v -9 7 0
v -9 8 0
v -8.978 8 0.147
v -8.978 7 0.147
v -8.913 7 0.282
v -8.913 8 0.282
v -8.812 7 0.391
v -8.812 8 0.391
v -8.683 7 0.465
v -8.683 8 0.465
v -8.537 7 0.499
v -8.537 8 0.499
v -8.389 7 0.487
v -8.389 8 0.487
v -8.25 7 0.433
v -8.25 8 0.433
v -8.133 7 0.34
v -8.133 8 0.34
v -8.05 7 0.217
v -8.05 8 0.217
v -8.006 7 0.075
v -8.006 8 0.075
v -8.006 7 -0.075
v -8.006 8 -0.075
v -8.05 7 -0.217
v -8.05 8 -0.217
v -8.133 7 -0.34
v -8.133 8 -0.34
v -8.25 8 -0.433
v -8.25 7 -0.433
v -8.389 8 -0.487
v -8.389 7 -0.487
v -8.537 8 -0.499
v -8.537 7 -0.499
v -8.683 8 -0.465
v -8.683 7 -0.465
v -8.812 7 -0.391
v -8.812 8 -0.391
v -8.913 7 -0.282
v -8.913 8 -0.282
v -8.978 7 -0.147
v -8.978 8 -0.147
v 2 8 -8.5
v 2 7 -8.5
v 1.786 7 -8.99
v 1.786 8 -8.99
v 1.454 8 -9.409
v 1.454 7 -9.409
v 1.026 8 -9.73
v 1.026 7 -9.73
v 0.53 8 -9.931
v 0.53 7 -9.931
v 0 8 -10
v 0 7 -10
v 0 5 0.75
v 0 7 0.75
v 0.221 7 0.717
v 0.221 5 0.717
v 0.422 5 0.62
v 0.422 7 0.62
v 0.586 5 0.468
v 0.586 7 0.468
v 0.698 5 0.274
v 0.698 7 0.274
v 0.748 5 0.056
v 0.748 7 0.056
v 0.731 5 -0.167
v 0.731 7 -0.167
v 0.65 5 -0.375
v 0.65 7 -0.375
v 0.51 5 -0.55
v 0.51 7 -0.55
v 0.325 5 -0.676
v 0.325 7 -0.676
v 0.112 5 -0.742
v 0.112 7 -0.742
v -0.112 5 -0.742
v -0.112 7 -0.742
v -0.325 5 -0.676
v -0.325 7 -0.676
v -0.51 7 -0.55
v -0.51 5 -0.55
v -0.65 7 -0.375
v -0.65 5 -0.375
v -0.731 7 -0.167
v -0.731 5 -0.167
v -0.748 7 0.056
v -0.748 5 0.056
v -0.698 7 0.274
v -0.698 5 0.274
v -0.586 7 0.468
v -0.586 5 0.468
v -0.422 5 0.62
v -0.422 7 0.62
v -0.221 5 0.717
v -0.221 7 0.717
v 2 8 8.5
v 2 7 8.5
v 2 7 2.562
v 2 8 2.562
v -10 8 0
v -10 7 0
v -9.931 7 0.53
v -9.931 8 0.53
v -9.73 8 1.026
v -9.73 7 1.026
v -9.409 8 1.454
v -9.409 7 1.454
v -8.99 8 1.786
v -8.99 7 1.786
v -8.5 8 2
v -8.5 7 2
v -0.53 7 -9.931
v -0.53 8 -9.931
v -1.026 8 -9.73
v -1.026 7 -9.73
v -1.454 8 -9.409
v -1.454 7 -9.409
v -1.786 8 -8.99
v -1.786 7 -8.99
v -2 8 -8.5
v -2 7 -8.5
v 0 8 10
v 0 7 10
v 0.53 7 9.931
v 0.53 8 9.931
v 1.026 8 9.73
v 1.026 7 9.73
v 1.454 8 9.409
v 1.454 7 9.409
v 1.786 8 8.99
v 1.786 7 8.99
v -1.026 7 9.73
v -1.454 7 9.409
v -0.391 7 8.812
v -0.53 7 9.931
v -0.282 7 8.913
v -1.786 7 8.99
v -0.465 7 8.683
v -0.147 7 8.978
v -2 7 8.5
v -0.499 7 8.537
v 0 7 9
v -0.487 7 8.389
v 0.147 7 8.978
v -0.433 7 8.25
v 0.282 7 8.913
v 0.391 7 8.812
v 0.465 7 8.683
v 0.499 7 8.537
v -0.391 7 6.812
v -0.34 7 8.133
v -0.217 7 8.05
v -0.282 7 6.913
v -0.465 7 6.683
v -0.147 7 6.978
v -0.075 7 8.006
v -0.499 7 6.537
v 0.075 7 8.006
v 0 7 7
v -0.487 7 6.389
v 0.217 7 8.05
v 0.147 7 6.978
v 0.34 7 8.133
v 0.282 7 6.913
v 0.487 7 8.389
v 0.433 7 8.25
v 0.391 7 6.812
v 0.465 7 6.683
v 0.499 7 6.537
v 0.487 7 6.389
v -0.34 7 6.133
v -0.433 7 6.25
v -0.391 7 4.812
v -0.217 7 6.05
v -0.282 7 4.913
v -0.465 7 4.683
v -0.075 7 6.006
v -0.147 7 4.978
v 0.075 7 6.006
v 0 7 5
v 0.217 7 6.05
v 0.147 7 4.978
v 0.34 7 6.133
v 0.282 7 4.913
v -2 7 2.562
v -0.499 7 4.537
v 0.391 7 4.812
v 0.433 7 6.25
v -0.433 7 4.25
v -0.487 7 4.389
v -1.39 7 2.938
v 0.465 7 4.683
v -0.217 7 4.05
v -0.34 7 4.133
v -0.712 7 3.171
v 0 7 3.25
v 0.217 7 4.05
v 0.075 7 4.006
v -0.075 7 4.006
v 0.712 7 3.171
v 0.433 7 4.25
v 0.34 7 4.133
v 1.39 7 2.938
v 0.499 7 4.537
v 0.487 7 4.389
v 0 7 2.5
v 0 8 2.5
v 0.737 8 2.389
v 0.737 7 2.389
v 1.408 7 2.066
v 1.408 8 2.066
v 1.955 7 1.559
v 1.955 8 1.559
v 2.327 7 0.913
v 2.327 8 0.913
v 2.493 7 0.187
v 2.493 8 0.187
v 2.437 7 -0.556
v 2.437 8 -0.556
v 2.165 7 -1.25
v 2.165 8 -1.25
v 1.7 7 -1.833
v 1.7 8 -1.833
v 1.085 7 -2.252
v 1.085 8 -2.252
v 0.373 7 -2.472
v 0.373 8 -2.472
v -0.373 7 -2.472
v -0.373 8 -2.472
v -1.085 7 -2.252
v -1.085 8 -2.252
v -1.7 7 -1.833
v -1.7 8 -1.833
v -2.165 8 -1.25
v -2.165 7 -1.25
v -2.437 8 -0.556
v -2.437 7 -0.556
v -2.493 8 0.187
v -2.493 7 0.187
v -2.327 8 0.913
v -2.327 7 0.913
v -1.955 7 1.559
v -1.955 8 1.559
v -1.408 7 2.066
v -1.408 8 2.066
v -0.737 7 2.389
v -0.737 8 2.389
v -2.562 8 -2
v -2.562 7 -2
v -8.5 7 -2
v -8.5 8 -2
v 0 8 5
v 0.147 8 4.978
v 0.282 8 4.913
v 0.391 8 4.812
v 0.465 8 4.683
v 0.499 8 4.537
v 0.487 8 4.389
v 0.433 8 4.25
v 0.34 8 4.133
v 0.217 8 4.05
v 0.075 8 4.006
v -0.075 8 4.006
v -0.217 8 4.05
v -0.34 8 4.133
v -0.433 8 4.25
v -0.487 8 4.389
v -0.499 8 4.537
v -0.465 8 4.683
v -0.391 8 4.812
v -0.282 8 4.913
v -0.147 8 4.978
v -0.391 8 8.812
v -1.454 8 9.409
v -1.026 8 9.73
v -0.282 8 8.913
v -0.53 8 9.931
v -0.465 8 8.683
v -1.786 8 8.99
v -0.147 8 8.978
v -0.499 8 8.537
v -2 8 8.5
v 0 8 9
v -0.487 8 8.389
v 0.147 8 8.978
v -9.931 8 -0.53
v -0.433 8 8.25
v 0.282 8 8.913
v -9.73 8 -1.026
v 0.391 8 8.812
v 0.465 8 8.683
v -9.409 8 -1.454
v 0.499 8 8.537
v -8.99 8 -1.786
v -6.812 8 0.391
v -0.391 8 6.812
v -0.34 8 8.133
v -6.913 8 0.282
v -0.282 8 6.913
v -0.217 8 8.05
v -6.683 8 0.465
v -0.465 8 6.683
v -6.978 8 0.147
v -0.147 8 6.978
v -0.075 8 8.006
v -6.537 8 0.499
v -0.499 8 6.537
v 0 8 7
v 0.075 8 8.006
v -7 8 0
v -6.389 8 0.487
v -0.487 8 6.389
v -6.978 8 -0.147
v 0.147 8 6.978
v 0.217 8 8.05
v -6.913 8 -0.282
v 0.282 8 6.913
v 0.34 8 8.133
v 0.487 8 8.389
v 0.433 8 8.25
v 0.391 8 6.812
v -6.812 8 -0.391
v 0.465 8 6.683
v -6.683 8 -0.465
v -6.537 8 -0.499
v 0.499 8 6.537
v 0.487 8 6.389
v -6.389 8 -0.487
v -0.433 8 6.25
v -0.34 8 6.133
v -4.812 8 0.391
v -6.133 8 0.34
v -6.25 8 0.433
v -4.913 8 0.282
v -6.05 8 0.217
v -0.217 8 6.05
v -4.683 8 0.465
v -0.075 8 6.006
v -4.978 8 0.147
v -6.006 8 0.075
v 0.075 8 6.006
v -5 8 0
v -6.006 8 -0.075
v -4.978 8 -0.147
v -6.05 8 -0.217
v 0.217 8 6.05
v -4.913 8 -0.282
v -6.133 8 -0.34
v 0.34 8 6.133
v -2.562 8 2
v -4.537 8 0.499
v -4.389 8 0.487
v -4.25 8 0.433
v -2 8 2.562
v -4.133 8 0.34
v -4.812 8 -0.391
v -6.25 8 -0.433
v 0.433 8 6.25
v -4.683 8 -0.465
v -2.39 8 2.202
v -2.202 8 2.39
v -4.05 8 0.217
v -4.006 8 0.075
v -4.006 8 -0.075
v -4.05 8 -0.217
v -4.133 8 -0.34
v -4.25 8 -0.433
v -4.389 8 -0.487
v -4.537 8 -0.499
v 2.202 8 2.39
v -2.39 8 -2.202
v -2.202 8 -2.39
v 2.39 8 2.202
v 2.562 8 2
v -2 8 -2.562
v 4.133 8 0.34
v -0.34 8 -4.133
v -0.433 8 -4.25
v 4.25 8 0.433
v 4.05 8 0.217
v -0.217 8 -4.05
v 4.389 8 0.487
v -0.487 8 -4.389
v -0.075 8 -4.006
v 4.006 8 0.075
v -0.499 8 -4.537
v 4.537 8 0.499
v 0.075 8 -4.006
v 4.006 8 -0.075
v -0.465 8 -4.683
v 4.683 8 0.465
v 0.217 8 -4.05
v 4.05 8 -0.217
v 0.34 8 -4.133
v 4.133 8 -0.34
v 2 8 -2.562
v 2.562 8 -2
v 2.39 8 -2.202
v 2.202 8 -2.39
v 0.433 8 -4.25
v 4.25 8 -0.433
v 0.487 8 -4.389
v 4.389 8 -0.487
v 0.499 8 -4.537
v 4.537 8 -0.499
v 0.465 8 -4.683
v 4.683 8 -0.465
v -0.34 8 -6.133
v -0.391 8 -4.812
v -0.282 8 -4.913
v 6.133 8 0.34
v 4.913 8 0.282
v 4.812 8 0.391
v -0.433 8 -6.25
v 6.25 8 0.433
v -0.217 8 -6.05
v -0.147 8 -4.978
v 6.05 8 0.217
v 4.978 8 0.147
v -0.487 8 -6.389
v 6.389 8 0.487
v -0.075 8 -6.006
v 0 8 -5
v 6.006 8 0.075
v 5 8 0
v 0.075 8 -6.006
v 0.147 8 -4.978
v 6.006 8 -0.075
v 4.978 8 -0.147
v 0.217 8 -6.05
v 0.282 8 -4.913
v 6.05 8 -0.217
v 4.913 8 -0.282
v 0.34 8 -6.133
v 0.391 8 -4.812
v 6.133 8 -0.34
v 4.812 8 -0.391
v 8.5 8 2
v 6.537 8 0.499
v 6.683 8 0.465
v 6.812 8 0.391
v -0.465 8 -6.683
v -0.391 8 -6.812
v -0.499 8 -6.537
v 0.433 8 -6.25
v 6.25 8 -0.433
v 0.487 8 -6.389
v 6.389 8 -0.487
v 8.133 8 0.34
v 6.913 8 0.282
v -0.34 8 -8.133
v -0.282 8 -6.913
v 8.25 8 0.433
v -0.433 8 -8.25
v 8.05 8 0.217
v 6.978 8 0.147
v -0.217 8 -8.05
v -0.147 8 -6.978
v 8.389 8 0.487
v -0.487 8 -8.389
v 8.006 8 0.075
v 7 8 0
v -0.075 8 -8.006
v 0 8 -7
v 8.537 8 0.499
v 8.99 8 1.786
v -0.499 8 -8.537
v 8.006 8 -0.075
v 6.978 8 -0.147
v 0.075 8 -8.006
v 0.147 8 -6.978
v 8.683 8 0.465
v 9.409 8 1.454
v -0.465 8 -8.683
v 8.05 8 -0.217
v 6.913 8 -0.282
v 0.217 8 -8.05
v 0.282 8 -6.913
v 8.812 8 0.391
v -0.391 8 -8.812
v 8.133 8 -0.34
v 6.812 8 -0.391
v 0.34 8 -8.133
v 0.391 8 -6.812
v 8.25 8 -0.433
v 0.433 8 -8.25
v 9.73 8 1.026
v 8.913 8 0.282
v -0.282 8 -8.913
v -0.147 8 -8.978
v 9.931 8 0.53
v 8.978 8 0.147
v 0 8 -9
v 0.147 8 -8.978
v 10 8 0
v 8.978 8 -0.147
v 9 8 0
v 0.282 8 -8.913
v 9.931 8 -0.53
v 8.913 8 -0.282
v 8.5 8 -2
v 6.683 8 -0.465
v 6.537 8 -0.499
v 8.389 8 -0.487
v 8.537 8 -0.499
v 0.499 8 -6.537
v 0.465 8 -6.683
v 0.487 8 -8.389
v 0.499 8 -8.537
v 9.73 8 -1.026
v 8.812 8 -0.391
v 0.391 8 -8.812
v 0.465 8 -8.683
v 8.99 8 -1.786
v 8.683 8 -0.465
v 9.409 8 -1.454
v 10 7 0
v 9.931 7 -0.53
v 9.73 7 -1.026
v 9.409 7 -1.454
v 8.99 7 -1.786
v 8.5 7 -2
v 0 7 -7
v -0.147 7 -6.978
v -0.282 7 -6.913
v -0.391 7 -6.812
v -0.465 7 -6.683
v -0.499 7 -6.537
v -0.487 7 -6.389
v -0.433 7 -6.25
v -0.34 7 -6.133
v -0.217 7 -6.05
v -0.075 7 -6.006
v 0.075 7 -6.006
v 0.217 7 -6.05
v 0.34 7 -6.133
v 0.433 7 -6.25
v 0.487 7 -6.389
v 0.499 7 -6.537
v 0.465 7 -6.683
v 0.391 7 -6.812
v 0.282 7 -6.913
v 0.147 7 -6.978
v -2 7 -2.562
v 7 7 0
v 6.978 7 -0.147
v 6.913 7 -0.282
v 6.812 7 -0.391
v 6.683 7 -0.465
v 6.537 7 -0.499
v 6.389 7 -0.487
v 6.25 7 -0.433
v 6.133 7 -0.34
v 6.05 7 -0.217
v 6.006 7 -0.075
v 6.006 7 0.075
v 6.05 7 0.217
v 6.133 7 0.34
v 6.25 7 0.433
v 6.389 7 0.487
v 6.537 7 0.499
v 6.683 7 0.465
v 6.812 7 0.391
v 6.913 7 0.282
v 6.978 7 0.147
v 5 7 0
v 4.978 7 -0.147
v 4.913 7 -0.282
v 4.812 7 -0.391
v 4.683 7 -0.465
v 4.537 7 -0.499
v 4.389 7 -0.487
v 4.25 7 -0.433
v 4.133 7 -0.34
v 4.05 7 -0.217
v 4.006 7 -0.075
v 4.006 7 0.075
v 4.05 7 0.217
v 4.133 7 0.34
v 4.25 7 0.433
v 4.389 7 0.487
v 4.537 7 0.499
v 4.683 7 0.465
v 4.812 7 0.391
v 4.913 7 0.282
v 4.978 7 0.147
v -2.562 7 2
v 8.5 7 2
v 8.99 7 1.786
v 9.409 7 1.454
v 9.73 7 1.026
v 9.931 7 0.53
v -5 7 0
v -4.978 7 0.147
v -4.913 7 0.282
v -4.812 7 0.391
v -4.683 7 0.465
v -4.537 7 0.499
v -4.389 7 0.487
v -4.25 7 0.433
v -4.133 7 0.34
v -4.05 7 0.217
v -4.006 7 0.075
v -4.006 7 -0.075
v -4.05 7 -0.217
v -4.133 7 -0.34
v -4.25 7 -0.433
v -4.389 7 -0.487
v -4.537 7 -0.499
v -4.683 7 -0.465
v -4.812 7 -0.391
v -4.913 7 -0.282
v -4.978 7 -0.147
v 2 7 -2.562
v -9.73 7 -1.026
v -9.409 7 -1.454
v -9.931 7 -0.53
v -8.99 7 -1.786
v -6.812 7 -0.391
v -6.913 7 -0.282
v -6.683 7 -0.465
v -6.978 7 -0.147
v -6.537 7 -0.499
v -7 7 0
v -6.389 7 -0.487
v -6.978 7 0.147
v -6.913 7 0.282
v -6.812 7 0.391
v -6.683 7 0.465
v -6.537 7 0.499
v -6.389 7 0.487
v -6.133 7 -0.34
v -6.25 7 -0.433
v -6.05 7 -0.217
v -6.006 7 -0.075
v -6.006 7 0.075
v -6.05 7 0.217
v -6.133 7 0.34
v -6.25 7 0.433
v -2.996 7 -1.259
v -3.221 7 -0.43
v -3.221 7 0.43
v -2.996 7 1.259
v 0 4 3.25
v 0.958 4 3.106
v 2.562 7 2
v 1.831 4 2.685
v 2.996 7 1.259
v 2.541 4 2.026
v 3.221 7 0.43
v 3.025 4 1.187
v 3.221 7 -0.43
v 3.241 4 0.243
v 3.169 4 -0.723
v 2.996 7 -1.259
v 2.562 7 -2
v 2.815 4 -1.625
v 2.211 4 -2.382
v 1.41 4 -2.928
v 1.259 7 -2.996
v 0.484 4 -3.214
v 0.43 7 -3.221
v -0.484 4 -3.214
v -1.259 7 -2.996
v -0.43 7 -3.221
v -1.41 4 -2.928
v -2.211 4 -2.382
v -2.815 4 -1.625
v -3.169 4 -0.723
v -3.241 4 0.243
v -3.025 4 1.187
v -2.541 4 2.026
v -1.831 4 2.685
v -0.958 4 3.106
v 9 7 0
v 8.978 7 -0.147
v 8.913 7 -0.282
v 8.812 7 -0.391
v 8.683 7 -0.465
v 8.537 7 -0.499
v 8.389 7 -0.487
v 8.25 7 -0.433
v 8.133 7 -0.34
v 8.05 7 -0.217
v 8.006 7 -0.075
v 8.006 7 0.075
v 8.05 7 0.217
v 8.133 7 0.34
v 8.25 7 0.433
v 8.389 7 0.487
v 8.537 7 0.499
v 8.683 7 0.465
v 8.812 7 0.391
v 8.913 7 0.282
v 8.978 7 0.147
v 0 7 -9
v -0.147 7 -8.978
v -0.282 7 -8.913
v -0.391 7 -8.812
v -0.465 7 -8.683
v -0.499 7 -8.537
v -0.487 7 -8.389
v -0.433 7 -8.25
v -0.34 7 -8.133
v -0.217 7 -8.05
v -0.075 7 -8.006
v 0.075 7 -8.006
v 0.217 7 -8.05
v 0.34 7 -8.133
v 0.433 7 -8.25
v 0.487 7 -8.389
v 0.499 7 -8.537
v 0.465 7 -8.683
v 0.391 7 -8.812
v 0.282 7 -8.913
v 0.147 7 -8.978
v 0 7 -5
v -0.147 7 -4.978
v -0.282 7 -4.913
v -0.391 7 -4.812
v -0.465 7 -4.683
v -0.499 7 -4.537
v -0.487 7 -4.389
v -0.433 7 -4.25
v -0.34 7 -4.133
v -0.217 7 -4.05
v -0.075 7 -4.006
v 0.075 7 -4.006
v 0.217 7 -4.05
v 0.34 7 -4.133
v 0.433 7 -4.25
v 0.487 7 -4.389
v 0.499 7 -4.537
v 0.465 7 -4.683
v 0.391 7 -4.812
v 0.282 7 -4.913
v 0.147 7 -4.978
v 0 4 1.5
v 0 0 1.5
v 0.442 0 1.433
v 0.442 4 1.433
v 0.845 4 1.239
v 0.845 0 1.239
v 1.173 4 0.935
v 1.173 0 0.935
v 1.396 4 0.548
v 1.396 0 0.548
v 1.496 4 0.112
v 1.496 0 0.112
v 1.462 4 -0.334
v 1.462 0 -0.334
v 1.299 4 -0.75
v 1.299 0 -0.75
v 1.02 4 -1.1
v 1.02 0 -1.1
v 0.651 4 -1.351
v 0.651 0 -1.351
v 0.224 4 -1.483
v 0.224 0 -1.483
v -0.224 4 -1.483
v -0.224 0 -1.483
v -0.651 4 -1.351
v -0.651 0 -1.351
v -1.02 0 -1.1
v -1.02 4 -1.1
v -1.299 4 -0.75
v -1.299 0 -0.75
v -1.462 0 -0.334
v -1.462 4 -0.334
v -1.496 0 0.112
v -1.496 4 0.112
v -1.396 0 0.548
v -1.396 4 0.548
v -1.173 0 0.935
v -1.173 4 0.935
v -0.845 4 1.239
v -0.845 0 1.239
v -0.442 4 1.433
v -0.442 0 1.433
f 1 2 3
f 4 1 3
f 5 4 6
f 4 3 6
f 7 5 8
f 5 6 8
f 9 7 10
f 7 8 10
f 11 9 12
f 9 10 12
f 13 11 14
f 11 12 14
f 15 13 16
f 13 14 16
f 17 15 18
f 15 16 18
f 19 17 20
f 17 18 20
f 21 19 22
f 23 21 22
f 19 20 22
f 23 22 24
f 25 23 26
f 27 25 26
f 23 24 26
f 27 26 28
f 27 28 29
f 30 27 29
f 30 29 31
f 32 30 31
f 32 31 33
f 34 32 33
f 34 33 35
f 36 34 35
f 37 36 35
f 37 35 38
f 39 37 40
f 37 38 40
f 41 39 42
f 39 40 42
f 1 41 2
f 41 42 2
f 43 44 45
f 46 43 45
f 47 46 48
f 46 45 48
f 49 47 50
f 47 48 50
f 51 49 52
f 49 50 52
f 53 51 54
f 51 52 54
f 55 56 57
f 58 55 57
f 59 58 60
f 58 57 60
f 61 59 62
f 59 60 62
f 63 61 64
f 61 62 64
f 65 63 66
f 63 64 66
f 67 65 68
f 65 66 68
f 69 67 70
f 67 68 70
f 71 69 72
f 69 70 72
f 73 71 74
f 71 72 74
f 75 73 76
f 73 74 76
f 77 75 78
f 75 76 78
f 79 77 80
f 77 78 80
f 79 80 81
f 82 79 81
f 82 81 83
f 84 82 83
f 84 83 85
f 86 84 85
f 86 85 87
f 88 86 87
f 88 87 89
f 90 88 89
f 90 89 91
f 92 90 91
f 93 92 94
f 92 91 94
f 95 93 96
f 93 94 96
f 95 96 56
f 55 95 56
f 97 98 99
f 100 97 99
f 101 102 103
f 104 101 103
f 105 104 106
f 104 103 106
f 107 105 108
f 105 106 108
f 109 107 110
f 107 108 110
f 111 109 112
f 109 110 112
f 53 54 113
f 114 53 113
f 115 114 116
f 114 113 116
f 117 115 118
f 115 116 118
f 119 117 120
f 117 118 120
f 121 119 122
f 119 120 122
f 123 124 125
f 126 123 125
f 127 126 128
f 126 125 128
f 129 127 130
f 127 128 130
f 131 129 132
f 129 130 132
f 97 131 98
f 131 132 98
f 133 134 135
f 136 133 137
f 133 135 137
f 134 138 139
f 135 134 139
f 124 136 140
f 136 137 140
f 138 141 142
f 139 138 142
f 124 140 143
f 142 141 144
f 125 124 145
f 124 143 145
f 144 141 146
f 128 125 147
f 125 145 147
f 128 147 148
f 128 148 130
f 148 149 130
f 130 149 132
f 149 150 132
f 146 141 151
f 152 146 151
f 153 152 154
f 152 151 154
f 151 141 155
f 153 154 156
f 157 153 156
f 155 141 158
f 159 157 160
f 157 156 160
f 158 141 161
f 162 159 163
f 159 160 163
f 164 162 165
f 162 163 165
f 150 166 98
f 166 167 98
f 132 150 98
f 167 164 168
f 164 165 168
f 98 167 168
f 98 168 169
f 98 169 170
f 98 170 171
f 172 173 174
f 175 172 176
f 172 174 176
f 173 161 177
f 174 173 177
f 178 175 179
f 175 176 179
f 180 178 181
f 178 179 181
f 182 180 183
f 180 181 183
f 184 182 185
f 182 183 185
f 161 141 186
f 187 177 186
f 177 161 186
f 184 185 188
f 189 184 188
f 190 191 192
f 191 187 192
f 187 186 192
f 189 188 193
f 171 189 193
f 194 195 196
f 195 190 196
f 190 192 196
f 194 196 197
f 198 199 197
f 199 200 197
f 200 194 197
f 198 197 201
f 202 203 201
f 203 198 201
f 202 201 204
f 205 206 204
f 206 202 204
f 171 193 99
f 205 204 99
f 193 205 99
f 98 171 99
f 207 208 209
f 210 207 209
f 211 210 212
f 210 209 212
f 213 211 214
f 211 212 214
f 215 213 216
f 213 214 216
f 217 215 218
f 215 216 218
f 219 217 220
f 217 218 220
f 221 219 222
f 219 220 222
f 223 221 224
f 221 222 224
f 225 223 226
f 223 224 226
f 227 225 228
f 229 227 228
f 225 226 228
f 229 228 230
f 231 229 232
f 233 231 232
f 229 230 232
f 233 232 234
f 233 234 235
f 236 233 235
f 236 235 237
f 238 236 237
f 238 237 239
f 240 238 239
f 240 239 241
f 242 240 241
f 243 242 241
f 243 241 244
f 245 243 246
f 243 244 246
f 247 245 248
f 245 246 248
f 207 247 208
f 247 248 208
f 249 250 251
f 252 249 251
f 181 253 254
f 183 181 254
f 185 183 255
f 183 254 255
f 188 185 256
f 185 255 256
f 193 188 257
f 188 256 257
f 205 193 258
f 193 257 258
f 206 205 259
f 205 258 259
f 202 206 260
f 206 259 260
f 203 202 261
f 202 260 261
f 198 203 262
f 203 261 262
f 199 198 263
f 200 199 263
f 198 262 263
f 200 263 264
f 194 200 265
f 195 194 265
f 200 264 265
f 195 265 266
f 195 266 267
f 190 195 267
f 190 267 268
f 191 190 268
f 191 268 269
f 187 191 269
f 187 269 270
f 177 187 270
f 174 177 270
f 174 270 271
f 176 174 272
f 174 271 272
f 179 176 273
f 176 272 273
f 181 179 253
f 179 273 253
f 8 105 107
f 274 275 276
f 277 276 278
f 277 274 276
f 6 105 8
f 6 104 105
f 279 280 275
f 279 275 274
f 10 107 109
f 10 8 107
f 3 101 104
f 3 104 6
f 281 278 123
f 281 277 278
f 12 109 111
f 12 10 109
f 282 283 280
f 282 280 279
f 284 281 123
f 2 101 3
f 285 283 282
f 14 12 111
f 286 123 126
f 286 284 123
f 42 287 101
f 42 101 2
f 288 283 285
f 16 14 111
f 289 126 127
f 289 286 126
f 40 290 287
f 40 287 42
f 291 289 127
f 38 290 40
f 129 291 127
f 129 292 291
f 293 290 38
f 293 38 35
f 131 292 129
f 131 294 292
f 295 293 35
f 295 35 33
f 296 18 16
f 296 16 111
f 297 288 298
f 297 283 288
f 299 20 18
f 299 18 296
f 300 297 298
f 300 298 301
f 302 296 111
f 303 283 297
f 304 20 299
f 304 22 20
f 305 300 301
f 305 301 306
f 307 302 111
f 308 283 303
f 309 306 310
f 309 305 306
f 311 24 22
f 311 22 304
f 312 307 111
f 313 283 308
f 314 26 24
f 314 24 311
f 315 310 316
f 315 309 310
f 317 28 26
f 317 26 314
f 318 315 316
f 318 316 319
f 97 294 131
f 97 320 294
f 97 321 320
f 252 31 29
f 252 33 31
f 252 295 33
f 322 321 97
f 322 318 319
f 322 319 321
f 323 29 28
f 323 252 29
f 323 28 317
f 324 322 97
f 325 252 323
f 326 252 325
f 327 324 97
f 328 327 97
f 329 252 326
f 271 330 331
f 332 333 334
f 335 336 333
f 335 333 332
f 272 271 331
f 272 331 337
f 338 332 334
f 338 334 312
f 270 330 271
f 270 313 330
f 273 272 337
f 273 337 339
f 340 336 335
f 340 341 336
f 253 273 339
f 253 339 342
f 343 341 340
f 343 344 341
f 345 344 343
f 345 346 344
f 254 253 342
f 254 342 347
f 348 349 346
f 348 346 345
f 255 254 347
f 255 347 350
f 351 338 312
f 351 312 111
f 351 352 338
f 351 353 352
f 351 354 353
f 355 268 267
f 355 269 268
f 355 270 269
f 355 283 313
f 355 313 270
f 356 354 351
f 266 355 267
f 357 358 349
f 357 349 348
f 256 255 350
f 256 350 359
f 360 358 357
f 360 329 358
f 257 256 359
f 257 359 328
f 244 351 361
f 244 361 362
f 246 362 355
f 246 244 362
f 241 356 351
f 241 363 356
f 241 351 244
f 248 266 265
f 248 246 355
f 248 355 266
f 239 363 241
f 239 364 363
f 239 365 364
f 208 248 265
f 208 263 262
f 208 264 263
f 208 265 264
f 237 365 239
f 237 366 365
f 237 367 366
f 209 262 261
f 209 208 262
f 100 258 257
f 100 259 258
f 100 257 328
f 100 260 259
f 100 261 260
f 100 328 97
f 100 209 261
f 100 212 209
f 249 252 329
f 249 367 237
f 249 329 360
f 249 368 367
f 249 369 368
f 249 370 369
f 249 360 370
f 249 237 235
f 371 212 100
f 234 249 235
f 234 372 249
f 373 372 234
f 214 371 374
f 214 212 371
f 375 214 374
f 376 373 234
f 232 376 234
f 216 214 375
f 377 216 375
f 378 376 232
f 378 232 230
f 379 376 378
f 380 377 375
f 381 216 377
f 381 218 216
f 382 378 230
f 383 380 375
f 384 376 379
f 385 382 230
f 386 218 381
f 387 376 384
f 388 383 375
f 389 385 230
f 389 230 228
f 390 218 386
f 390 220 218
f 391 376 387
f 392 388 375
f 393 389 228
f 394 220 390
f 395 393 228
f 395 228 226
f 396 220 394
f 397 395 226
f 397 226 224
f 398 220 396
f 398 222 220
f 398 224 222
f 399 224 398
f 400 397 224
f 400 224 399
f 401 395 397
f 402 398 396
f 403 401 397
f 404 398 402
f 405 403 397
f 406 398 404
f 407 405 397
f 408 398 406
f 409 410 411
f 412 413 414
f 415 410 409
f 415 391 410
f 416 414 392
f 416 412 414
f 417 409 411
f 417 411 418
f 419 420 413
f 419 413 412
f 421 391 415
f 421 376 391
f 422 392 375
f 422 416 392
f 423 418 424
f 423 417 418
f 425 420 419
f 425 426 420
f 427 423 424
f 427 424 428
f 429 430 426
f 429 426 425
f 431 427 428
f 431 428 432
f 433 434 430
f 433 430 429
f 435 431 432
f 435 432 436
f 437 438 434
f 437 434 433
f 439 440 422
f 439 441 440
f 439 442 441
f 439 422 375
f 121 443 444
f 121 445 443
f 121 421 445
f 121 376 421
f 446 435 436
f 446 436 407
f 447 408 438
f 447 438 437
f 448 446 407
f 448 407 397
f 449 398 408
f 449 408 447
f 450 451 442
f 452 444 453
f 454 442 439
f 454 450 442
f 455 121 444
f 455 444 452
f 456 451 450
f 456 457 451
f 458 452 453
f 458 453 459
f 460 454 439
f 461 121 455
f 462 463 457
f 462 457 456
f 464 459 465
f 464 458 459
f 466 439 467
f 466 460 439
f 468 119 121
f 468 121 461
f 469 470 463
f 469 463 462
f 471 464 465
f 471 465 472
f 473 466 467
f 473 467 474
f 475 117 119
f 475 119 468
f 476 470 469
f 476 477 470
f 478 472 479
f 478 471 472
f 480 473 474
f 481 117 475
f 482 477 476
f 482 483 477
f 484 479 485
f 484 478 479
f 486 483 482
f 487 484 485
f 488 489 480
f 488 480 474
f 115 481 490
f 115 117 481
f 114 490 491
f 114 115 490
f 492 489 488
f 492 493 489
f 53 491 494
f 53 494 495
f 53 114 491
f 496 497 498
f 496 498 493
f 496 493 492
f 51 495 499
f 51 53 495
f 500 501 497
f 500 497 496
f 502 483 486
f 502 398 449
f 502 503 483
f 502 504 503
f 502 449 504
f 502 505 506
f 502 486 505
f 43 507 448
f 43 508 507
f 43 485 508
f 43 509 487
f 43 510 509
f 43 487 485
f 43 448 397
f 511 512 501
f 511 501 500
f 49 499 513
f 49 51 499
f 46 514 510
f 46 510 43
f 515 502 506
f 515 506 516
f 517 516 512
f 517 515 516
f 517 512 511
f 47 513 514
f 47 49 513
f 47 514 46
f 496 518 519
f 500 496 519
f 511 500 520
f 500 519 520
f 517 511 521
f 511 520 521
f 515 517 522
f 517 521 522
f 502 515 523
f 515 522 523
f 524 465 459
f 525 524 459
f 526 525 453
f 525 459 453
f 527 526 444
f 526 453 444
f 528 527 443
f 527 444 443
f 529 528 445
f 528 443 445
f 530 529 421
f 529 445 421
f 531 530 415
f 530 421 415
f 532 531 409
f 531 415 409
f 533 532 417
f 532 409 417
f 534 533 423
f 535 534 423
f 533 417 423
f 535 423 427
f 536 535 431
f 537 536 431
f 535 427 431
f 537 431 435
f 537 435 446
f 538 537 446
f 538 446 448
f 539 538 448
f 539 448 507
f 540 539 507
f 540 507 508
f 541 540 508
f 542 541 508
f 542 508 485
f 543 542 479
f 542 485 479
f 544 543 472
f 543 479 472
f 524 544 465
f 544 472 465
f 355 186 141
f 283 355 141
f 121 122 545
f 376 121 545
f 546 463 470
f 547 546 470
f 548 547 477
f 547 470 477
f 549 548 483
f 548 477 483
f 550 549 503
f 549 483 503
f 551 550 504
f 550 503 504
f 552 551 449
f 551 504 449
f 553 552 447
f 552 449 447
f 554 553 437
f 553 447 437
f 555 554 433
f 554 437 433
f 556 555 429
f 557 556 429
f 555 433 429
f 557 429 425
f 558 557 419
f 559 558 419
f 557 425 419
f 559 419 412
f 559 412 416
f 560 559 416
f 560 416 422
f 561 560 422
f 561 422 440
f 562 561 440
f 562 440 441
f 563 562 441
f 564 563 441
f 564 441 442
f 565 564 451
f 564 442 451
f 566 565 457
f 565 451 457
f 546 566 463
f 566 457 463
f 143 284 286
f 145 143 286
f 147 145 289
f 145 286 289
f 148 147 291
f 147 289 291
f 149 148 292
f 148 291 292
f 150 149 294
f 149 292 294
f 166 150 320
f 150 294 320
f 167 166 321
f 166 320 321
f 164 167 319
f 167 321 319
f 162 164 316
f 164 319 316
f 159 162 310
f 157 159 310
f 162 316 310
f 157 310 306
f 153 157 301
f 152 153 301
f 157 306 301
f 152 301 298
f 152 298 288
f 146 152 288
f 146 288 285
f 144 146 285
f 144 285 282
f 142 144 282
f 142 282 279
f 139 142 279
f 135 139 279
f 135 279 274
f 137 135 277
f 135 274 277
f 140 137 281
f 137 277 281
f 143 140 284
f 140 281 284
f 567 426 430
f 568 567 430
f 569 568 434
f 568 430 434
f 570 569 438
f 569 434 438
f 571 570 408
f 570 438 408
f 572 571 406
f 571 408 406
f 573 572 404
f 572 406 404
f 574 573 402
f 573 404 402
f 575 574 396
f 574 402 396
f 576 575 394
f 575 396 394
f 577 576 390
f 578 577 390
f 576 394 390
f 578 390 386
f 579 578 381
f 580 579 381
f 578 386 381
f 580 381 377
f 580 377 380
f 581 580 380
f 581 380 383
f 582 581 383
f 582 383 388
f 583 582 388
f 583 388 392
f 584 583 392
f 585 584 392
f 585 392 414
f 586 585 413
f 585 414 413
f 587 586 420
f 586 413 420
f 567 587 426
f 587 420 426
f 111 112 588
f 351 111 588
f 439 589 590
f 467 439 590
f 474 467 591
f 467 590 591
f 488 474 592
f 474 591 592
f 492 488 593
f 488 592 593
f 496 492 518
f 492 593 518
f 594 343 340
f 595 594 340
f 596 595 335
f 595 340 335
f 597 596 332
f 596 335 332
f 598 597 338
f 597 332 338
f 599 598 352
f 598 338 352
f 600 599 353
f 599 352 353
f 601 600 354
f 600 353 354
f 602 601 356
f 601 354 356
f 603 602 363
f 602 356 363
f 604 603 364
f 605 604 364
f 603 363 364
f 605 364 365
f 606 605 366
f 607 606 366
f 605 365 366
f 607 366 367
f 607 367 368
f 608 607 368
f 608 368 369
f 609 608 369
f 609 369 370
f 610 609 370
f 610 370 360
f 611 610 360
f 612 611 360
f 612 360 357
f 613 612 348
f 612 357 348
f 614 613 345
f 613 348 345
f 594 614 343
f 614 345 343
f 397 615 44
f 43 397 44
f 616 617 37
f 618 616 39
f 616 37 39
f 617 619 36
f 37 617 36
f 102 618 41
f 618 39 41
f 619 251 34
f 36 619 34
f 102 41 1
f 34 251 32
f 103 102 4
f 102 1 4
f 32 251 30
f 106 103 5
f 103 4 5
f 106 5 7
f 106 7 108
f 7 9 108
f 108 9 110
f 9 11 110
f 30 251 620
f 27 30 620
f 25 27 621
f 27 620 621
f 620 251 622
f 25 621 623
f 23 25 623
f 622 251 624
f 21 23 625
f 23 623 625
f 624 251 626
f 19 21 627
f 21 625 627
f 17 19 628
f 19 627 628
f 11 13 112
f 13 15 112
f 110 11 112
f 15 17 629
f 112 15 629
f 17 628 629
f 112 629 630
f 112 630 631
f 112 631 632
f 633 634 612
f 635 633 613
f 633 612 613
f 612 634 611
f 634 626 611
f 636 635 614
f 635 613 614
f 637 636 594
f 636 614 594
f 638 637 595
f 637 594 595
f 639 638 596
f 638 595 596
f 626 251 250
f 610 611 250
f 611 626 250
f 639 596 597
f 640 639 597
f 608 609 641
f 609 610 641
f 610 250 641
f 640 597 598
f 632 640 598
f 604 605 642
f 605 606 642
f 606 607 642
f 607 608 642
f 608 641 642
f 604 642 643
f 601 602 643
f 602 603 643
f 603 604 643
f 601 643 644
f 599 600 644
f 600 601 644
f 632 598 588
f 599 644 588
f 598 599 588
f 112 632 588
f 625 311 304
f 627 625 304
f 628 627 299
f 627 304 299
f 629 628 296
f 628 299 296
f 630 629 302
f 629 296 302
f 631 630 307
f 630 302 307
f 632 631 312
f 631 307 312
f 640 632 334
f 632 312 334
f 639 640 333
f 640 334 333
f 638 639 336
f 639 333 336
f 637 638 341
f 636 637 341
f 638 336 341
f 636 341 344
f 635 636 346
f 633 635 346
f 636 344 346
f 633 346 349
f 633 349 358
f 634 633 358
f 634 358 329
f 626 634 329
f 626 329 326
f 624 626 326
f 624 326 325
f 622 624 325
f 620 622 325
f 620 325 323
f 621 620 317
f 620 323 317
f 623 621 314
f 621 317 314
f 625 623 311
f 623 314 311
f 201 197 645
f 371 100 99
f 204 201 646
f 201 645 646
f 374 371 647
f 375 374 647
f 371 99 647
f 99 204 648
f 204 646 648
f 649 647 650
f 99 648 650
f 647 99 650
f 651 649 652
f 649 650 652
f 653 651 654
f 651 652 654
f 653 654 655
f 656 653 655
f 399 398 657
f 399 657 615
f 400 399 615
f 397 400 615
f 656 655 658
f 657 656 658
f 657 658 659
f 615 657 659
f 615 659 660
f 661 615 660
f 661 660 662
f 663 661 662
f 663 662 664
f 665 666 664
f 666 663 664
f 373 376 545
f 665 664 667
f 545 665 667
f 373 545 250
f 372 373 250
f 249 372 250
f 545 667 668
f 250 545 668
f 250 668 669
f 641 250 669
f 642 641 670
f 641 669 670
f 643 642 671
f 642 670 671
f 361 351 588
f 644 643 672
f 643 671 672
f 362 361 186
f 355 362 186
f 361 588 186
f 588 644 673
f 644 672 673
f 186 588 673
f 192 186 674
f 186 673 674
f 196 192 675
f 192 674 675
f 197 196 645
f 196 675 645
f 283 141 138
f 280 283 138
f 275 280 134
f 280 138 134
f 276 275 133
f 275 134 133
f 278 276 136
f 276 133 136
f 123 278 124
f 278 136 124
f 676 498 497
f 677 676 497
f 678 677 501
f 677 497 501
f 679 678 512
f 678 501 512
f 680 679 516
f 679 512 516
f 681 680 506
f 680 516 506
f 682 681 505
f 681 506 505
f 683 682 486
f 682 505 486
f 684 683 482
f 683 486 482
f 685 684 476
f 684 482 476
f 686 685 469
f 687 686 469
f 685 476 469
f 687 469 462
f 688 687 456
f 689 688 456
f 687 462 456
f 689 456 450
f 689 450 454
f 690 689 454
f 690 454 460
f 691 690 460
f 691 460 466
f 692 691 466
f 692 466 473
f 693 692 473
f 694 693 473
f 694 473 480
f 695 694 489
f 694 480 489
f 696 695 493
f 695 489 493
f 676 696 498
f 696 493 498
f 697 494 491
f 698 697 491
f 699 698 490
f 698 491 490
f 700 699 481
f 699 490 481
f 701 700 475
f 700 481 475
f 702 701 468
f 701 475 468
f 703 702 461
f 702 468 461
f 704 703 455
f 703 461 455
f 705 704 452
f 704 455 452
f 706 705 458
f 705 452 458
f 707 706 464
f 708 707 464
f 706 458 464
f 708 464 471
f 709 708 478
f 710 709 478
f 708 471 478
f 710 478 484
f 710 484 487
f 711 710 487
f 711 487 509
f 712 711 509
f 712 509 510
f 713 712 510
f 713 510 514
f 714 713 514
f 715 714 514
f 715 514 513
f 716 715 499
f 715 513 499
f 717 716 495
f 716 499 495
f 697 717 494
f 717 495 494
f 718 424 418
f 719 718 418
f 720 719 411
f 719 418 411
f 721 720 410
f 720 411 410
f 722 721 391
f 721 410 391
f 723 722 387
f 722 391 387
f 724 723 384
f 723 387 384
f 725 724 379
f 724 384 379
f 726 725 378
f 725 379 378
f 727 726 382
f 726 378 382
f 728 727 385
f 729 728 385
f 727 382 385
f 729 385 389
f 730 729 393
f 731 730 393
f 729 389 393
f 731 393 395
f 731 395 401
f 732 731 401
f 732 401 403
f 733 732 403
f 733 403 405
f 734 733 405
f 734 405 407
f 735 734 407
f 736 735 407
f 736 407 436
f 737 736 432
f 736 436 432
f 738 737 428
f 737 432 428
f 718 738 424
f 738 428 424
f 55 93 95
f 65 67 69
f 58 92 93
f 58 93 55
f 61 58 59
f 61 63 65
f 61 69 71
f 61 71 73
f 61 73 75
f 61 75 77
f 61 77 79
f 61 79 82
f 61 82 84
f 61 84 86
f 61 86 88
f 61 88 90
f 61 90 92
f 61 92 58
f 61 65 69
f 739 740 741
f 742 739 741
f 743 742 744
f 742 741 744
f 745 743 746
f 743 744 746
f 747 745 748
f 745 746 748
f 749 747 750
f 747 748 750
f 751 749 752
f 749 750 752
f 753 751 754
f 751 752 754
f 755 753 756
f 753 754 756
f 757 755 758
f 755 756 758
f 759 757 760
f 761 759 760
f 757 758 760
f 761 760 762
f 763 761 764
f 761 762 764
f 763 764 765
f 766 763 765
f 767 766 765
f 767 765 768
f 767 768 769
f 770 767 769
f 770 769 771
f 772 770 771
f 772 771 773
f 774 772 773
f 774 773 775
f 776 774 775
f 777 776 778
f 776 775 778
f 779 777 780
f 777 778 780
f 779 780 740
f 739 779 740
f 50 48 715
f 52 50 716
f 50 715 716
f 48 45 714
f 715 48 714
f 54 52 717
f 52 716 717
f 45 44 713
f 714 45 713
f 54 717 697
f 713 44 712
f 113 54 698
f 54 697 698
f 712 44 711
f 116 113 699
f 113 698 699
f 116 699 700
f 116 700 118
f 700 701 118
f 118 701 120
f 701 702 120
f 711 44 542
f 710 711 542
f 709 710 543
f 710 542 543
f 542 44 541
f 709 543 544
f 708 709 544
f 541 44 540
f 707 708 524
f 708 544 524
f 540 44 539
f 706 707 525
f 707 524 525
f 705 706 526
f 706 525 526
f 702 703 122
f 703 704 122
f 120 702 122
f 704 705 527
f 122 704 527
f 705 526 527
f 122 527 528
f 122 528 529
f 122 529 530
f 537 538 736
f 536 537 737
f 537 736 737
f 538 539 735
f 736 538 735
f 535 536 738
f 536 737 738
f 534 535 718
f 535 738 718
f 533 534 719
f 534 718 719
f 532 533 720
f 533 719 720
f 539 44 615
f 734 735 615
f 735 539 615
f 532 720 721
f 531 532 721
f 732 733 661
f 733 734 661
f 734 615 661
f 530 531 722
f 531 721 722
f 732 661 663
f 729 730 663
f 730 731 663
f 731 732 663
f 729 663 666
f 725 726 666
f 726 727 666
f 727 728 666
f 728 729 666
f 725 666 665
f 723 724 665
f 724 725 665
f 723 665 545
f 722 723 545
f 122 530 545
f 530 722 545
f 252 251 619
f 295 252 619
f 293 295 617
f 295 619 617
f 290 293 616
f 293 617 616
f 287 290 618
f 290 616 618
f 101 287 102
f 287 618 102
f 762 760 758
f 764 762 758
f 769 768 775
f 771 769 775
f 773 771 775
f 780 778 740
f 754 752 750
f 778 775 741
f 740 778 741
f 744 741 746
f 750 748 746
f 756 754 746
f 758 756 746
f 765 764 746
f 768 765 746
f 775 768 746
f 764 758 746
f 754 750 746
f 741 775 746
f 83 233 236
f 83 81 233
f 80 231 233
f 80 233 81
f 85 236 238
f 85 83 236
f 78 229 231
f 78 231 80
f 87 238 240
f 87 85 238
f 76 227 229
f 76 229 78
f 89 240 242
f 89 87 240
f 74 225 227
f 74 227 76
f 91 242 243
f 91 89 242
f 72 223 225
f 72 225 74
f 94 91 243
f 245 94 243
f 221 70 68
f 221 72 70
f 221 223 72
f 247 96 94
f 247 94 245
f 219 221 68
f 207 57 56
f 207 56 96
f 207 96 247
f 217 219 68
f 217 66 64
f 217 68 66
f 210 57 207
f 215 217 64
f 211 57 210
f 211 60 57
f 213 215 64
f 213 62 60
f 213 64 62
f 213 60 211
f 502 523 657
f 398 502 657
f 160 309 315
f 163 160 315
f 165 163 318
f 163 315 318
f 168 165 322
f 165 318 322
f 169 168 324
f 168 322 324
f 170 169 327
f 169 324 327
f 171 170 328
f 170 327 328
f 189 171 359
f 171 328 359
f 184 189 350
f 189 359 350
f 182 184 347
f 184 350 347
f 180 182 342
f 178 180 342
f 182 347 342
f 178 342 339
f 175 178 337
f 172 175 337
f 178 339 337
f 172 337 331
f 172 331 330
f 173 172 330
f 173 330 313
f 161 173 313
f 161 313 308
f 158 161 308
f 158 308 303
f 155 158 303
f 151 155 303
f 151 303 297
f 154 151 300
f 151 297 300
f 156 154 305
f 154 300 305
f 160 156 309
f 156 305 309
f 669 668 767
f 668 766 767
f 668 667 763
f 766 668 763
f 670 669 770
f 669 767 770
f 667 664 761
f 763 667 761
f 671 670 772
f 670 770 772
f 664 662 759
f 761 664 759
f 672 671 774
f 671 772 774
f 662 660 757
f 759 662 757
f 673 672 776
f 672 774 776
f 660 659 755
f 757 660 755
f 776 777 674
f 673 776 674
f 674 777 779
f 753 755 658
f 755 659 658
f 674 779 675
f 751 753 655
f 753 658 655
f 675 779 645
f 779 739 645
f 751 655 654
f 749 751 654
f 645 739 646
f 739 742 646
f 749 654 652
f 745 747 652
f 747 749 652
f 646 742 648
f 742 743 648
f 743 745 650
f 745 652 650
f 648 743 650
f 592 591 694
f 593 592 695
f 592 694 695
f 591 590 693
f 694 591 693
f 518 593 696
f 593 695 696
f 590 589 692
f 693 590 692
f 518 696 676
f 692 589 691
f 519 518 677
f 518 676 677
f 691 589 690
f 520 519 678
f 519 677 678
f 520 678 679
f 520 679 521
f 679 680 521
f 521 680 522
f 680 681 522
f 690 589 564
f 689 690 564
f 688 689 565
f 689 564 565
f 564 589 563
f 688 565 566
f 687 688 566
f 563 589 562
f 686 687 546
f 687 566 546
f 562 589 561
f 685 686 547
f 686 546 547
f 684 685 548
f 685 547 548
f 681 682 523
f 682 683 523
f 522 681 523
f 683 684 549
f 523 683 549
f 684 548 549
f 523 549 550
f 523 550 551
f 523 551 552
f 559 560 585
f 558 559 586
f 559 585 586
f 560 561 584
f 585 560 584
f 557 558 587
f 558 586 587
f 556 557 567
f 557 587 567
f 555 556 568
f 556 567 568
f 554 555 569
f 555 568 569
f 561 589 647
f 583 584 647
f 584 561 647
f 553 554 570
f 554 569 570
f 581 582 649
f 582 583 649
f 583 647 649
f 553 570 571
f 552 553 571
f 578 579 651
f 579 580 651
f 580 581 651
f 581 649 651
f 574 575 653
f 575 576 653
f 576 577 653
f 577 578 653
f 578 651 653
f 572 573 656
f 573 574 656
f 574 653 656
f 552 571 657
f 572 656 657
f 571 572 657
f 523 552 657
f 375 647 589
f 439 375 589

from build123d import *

# Parameters (mm, degrees)
ESQUISSE1_R                            = 1.5
BOSS_EXTRU_1_DEPTH                     = 4
ESQUISSE2_R                            = 3.25
BOSS_EXTRU_2_DEPTH                     = 4
BOSS_EXTRU_3_START                     = -1
BOSS_EXTRU_3_DEPTH                     = 1
R_P_TITION_CIRCULAIRE6_COUNT           = 4
ESQUISSE5_R                            = 0.5
ENL_V_MAT_EXTRU_1_DEPTH                = 1
R_P_TITION_LIN_AIRE1_COUNT             = 3
R_P_TITION_LIN_AIRE1_PITCH             = 2
R_P_TITION_CIRCULAIRE7_COUNT           = 4
R_P_TITION_CIRCULAIRE7_COPY_1_SKETCH_R = 0.5
R_P_TITION_CIRCULAIRE7_COPY_1_DEPTH    = 1
R_P_TITION_CIRCULAIRE7_COPY_2_SKETCH_R = 0.5
R_P_TITION_CIRCULAIRE7_COPY_2_DEPTH    = 1
R_P_TITION_CIRCULAIRE7_COPY_3_SKETCH_R = 0.5
R_P_TITION_CIRCULAIRE7_COPY_3_DEPTH    = 1
R_P_TITION_CIRCULAIRE7_COPY_4_SKETCH_R = 0.5
R_P_TITION_CIRCULAIRE7_COPY_4_DEPTH    = 1
R_P_TITION_CIRCULAIRE7_COPY_5_SKETCH_R = 0.5
R_P_TITION_CIRCULAIRE7_COPY_5_DEPTH    = 1
R_P_TITION_CIRCULAIRE7_COPY_6_SKETCH_R = 0.5
R_P_TITION_CIRCULAIRE7_COPY_6_DEPTH    = 1
ESQUISSE6_R                            = 2.5
ENL_V_MAT_EXTRU_2_DEPTH                = 1
ESQUISSE7_R                            = 0.75
ENL_V_MAT_EXTRU_3_DEPTH                = 2


with BuildPart() as part:
    # Esquisse1 → Boss.-Extru.1 (new body)
    with BuildSketch(Plane(origin=(0, 0, 0), x_dir=(1, 0, 0), z_dir=(0, 1, 0))):
        with Locations(Location((0, 0, 0), (0, 0, 270))):
            Circle(ESQUISSE1_R)
    extrude(amount=BOSS_EXTRU_1_DEPTH)

    # Esquisse2 → Boss.-Extru.2 (add)
    with BuildSketch(Plane(origin=(0, 4, 0), x_dir=(1, 0, 0), z_dir=(0, 1, 0))):
        with Locations(Location((0, 0, 0), (0, 0, 270))):
            Circle(ESQUISSE2_R)
    extrude(amount=BOSS_EXTRU_2_DEPTH)

    # Esquisse3 → Boss.-Extru.3 (add)
    with BuildSketch(Plane(origin=(0, 8, 0), x_dir=(1, 0, 0), z_dir=(0, 1, 0)).offset(BOSS_EXTRU_3_START)):
        with BuildLine():
            ThreePointArc((-2, -8.5), (-1.25, -9.583333333), (0, -10))
            ThreePointArc((0, -10), (1.25, -9.583333333), (2, -8.5))
            Line((2, -8.5), (2, -2.561737691))
            ThreePointArc((2, -2.561737691), (0, -3.25), (-2, -2.561737691))
            Line((-2, -2.561737691), (-2, -8.5))
        make_face()
    boss_extru_3 = extrude(amount=BOSS_EXTRU_3_DEPTH)

    # Répétition circulaire6: Boss.-Extru.3 ×4 about axis
    r_p_tition_circulaire6_axis = Axis((0, 0, 0), (0, 1, 0))
    for i in range(1, R_P_TITION_CIRCULAIRE6_COUNT):
        add(boss_extru_3.rotate(r_p_tition_circulaire6_axis, i * 360 / R_P_TITION_CIRCULAIRE6_COUNT))

    # Esquisse5 → Enlèv. mat.-Extru.1 (cut)
    with BuildSketch(Plane(origin=(0, 8, 0), x_dir=(1, 0, 0), z_dir=(0, 1, 0))):
        with Locations(Location((0, -8.5, 0), (0, 0, 270))):
            Circle(ESQUISSE5_R)
    enl_v_mat_extru_1 = extrude(amount=-ENL_V_MAT_EXTRU_1_DEPTH, mode=Mode.SUBTRACT)

    # Répétition linéaire1: Enlèv. mat.-Extru.1 ×3
    with Locations(*[(0, 0, -i * R_P_TITION_LIN_AIRE1_PITCH) for i in range(1, R_P_TITION_LIN_AIRE1_COUNT)]):
        add(enl_v_mat_extru_1, mode=Mode.SUBTRACT)

    # Répétition circulaire7: Enlèv. mat.-Extru.1 ×4 about axis
    r_p_tition_circulaire7_axis = Axis((0, 0, 0), (0, 1, 0))
    for i in range(1, R_P_TITION_CIRCULAIRE7_COUNT):
        add(enl_v_mat_extru_1.rotate(r_p_tition_circulaire7_axis, i * 360 / R_P_TITION_CIRCULAIRE7_COUNT), mode=Mode.SUBTRACT)

    # Répétition circulaire7 copy 1 sketch → Répétition circulaire7 copy 1 (cut)
    with BuildSketch(Plane(origin=(-2, 8, 0), x_dir=(0, 0, -1), z_dir=(0, 1, 0))):
        with Locations(Location((0, -8.5, 0), (0, 0, 270))):
            Circle(R_P_TITION_CIRCULAIRE7_COPY_1_SKETCH_R)
    extrude(amount=-R_P_TITION_CIRCULAIRE7_COPY_1_DEPTH, mode=Mode.SUBTRACT)

    # Répétition circulaire7 copy 2 sketch → Répétition circulaire7 copy 2 (cut)
    with BuildSketch(Plane(origin=(0, 8, 2), x_dir=(-1, 0, 0), z_dir=(0, 1, 0))):
        with Locations(Location((0, -8.5, 0), (0, 0, 270))):
            Circle(R_P_TITION_CIRCULAIRE7_COPY_2_SKETCH_R)
    extrude(amount=-R_P_TITION_CIRCULAIRE7_COPY_2_DEPTH, mode=Mode.SUBTRACT)

    # Répétition circulaire7 copy 3 sketch → Répétition circulaire7 copy 3 (cut)
    with BuildSketch(Plane(origin=(2, 8, 0), x_dir=(0, 0, 1), z_dir=(0, 1, 0))):
        with Locations(Location((0, -8.5, 0), (0, 0, 270))):
            Circle(R_P_TITION_CIRCULAIRE7_COPY_3_SKETCH_R)
    extrude(amount=-R_P_TITION_CIRCULAIRE7_COPY_3_DEPTH, mode=Mode.SUBTRACT)

    # Répétition circulaire7 copy 4 sketch → Répétition circulaire7 copy 4 (cut)
    with BuildSketch(Plane(origin=(-4, 8, 0), x_dir=(0, 0, -1), z_dir=(0, 1, 0))):
        with Locations(Location((0, -8.5, 0), (0, 0, 270))):
            Circle(R_P_TITION_CIRCULAIRE7_COPY_4_SKETCH_R)
    extrude(amount=-R_P_TITION_CIRCULAIRE7_COPY_4_DEPTH, mode=Mode.SUBTRACT)

    # Répétition circulaire7 copy 5 sketch → Répétition circulaire7 copy 5 (cut)
    with BuildSketch(Plane(origin=(0, 8, 4), x_dir=(-1, 0, 0), z_dir=(0, 1, 0))):
        with Locations(Location((0, -8.5, 0), (0, 0, 270))):
            Circle(R_P_TITION_CIRCULAIRE7_COPY_5_SKETCH_R)
    extrude(amount=-R_P_TITION_CIRCULAIRE7_COPY_5_DEPTH, mode=Mode.SUBTRACT)

    # Répétition circulaire7 copy 6 sketch → Répétition circulaire7 copy 6 (cut)
    with BuildSketch(Plane(origin=(4, 8, 0), x_dir=(0, 0, 1), z_dir=(0, 1, 0))):
        with Locations(Location((0, -8.5, 0), (0, 0, 270))):
            Circle(R_P_TITION_CIRCULAIRE7_COPY_6_SKETCH_R)
    extrude(amount=-R_P_TITION_CIRCULAIRE7_COPY_6_DEPTH, mode=Mode.SUBTRACT)

    # Esquisse6 → Enlèv. mat.-Extru.2 (cut)
    with BuildSketch(Plane(origin=(0, 8, 0), x_dir=(1, 0, 0), z_dir=(0, 1, 0))):
        with Locations(Location((0, 0, 0), (0, 0, 270))):
            Circle(ESQUISSE6_R)
    extrude(amount=-ENL_V_MAT_EXTRU_2_DEPTH, mode=Mode.SUBTRACT)

    # Esquisse7 → Enlèv. mat.-Extru.3 (cut)
    with BuildSketch(Plane(origin=(0, 7, 0), x_dir=(1, 0, 0), z_dir=(0, 1, 0))):
        with Locations(Location((0, 0, 0), (0, 0, 270))):
            Circle(ESQUISSE7_R)
    extrude(amount=-ENL_V_MAT_EXTRU_3_DEPTH, mode=Mode.SUBTRACT)


solid = part.part
